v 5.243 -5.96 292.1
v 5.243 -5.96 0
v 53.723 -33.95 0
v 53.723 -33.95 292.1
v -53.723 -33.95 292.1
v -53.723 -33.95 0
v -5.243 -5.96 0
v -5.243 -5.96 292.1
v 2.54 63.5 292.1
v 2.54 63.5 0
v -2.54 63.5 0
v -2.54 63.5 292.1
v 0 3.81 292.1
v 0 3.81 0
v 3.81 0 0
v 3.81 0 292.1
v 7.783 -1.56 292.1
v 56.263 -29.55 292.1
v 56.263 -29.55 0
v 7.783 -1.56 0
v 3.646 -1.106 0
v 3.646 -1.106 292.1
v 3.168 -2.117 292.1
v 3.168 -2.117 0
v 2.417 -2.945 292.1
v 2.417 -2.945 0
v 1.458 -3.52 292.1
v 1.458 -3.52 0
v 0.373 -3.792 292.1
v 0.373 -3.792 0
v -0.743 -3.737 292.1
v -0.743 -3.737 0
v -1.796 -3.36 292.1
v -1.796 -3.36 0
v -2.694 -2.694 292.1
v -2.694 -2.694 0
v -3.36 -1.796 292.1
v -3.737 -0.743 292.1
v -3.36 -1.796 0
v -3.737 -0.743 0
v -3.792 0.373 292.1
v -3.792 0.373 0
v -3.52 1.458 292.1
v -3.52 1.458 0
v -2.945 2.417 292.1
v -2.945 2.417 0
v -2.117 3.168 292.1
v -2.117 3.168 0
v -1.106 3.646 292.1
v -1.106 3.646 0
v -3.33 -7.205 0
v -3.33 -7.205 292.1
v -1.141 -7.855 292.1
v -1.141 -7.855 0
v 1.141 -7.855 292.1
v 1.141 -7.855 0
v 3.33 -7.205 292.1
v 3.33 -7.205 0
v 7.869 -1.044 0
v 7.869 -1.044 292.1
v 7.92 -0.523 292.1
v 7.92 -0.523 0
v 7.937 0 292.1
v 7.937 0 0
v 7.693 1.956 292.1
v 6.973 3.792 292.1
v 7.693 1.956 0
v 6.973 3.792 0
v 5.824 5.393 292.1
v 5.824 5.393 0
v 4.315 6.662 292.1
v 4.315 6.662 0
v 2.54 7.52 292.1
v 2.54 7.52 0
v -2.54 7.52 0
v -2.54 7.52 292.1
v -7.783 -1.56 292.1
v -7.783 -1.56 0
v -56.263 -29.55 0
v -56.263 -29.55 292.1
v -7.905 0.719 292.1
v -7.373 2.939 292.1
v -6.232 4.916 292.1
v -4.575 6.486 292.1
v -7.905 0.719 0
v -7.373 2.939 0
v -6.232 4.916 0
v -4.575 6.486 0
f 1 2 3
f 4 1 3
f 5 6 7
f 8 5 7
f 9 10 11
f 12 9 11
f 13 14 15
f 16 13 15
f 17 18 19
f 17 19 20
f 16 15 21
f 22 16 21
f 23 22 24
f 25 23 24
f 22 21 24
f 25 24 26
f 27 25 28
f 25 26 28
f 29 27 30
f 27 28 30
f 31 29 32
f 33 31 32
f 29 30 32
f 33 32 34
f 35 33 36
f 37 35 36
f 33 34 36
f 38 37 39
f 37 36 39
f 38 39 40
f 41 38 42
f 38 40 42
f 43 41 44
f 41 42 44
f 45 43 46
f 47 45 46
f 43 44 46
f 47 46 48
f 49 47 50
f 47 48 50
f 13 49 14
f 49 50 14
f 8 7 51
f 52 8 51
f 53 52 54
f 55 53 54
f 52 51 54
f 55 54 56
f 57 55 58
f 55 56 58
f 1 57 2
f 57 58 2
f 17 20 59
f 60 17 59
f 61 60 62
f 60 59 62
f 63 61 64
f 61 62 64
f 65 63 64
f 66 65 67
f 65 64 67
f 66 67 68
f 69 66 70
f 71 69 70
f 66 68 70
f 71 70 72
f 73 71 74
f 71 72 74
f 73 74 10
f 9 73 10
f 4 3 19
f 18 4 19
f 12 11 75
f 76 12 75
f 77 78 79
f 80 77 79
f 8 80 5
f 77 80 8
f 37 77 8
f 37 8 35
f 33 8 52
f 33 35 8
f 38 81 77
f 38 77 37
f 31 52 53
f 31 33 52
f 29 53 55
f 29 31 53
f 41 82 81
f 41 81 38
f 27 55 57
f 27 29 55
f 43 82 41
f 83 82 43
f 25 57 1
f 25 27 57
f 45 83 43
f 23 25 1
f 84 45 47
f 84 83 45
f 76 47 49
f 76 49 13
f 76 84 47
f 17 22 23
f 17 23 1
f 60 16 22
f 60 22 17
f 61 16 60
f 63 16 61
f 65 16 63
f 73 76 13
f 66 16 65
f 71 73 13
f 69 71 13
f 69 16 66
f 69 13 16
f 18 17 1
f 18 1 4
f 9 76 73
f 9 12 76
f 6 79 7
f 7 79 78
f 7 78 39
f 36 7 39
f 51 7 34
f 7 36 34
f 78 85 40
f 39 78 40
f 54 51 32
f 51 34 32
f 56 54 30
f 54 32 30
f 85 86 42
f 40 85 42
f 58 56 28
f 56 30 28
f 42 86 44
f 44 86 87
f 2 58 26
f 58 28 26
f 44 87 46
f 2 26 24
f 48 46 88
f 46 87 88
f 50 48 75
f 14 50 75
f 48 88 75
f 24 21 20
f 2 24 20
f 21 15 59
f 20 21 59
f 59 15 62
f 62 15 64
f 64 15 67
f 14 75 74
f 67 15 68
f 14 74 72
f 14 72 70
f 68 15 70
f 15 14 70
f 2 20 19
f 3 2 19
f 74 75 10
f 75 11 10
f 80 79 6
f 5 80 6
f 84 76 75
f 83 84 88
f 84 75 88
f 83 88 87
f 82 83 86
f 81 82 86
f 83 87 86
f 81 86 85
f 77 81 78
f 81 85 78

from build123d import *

# Parameters (mm, degrees)
BOSS_EXTRUDE1_DEPTH     = 292.1
CUT_EXTRUDE1_DEPTH      = 305.17123736
CUT_EXTRUDE1_DEPTH_BACK = 305.17123736


with BuildPart() as part:
    # Sketch1 → Boss-Extrude1 (new body)
    with BuildSketch(Plane.XY):
        with BuildLine():
            Line((-2.54, 1.466469684), (-2.54, 7.520126744))
            ThreePointArc((-2.54, 7.520126744), (-6.874076643, 3.96875), (-7.7826208, -1.560358847))
            Line((-7.7826208, -1.560358847), (-2.54, 1.466469684))
        make_face()
        with BuildLine():
            ThreePointArc((-5.2426208, -5.959767898), (0, -7.9375), (5.2426208, -5.959767898))
            Line((5.2426208, -5.959767898), (0, -2.932939367))
            Line((0, -2.932939367), (-5.2426208, -5.959767898))
        make_face()
        with BuildLine():
            ThreePointArc((7.9375, 0), (6.448455484, 4.628318067), (2.54, 7.520126744))
            Line((2.54, 7.520126744), (2.54, 1.466469684))
            Line((2.54, 1.466469684), (7.7826208, -1.560358847))
            ThreePointArc((7.7826208, -1.560358847), (7.898685297, -0.784013281), (7.9375, 0))
        make_face()
        with BuildLine():
            Line((6.874076643, -3.96875), (0, 0))
            Line((0, 0), (-6.874076643, -3.96875))
            ThreePointArc((-6.874076643, -3.96875), (-6.139595043, -5.030832829), (-5.2426208, -5.959767898))
            Line((-5.2426208, -5.959767898), (0, -2.932939367))
            Line((0, -2.932939367), (5.2426208, -5.959767898))
            ThreePointArc((5.2426208, -5.959767898), (6.139595043, -5.030832829), (6.874076643, -3.96875))
        make_face()
        with BuildLine():
            Line((-6.874076643, -3.96875), (0, 0))
            Line((0, 0), (0, 7.9375))
            ThreePointArc((0, 7.9375), (-1.28703151, 7.832461691), (-2.54, 7.520126744))
            Line((-2.54, 7.520126744), (-2.54, 1.466469684))
            Line((-2.54, 1.466469684), (-7.7826208, -1.560358847))
            ThreePointArc((-7.7826208, -1.560358847), (-7.426626554, -2.801628862), (-6.874076643, -3.96875))
        make_face()
        with BuildLine():
            Line((0, 7.9375), (0, 0))
            Line((0, 0), (6.874076643, -3.96875))
            ThreePointArc((6.874076643, -3.96875), (7.426626554, -2.801628862), (7.7826208, -1.560358847))
            Line((7.7826208, -1.560358847), (2.54, 1.466469684))
            Line((2.54, 1.466469684), (2.54, 7.520126744))
            ThreePointArc((2.54, 7.520126744), (1.28703151, 7.832461691), (0, 7.9375))
        make_face()
        with BuildLine():
            Line((0, 63.5), (0, 7.9375))
            ThreePointArc((0, 7.9375), (1.28703151, 7.832461691), (2.54, 7.520126744))
            Line((2.54, 7.520126744), (2.54, 63.5))
            Line((2.54, 63.5), (0, 63.5))
        make_face()
        with BuildLine():
            ThreePointArc((-2.54, 7.520126744), (-1.28703151, 7.832461691), (0, 7.9375))
            Line((0, 7.9375), (0, 63.5))
            Line((0, 63.5), (-2.54, 63.5))
            Line((-2.54, 63.5), (-2.54, 7.520126744))
        make_face()
        with BuildLine():
            Line((-54.99261314, -31.75), (-6.874076643, -3.96875))
            ThreePointArc((-6.874076643, -3.96875), (-7.426626554, -2.801628862), (-7.7826208, -1.560358847))
            Line((-7.7826208, -1.560358847), (-56.26261314, -29.550295474))
            Line((-56.26261314, -29.550295474), (-54.99261314, -31.75))
        make_face()
        with BuildLine():
            ThreePointArc((-5.2426208, -5.959767898), (-6.139595043, -5.030832829), (-6.874076643, -3.96875))
            Line((-6.874076643, -3.96875), (-54.99261314, -31.75))
            Line((-54.99261314, -31.75), (-53.72261314, -33.949704526))
            Line((-53.72261314, -33.949704526), (-5.2426208, -5.959767898))
        make_face()
        with BuildLine():
            Line((54.99261314, -31.75), (6.874076643, -3.96875))
            ThreePointArc((6.874076643, -3.96875), (6.139595043, -5.030832829), (5.2426208, -5.959767898))
            Line((5.2426208, -5.959767898), (53.72261314, -33.949704526))
            Line((53.72261314, -33.949704526), (54.99261314, -31.75))
        make_face()
        with BuildLine():
            ThreePointArc((7.7826208, -1.560358847), (7.426626554, -2.801628862), (6.874076643, -3.96875))
            Line((6.874076643, -3.96875), (54.99261314, -31.75))
            Line((54.99261314, -31.75), (56.26261314, -29.550295474))
            Line((56.26261314, -29.550295474), (7.7826208, -1.560358847))
        make_face()
    extrude(amount=BOSS_EXTRUDE1_DEPTH)

    # Sketch2 → Cut-Extrude1 (cut, two sides: drawn at the far end of the back side and taken through both)
    with BuildSketch(Plane.XY.offset(292.1).offset(-CUT_EXTRUDE1_DEPTH_BACK)):
        with BuildLine():
            Line((0, 3.81), (3.81, 0))
            ThreePointArc((3.81, 0), (-2.694076836, -2.694076836), (0, 3.81))
        make_face()
    extrude(amount=CUT_EXTRUDE1_DEPTH + CUT_EXTRUDE1_DEPTH_BACK, mode=Mode.SUBTRACT)


solid = part.part
